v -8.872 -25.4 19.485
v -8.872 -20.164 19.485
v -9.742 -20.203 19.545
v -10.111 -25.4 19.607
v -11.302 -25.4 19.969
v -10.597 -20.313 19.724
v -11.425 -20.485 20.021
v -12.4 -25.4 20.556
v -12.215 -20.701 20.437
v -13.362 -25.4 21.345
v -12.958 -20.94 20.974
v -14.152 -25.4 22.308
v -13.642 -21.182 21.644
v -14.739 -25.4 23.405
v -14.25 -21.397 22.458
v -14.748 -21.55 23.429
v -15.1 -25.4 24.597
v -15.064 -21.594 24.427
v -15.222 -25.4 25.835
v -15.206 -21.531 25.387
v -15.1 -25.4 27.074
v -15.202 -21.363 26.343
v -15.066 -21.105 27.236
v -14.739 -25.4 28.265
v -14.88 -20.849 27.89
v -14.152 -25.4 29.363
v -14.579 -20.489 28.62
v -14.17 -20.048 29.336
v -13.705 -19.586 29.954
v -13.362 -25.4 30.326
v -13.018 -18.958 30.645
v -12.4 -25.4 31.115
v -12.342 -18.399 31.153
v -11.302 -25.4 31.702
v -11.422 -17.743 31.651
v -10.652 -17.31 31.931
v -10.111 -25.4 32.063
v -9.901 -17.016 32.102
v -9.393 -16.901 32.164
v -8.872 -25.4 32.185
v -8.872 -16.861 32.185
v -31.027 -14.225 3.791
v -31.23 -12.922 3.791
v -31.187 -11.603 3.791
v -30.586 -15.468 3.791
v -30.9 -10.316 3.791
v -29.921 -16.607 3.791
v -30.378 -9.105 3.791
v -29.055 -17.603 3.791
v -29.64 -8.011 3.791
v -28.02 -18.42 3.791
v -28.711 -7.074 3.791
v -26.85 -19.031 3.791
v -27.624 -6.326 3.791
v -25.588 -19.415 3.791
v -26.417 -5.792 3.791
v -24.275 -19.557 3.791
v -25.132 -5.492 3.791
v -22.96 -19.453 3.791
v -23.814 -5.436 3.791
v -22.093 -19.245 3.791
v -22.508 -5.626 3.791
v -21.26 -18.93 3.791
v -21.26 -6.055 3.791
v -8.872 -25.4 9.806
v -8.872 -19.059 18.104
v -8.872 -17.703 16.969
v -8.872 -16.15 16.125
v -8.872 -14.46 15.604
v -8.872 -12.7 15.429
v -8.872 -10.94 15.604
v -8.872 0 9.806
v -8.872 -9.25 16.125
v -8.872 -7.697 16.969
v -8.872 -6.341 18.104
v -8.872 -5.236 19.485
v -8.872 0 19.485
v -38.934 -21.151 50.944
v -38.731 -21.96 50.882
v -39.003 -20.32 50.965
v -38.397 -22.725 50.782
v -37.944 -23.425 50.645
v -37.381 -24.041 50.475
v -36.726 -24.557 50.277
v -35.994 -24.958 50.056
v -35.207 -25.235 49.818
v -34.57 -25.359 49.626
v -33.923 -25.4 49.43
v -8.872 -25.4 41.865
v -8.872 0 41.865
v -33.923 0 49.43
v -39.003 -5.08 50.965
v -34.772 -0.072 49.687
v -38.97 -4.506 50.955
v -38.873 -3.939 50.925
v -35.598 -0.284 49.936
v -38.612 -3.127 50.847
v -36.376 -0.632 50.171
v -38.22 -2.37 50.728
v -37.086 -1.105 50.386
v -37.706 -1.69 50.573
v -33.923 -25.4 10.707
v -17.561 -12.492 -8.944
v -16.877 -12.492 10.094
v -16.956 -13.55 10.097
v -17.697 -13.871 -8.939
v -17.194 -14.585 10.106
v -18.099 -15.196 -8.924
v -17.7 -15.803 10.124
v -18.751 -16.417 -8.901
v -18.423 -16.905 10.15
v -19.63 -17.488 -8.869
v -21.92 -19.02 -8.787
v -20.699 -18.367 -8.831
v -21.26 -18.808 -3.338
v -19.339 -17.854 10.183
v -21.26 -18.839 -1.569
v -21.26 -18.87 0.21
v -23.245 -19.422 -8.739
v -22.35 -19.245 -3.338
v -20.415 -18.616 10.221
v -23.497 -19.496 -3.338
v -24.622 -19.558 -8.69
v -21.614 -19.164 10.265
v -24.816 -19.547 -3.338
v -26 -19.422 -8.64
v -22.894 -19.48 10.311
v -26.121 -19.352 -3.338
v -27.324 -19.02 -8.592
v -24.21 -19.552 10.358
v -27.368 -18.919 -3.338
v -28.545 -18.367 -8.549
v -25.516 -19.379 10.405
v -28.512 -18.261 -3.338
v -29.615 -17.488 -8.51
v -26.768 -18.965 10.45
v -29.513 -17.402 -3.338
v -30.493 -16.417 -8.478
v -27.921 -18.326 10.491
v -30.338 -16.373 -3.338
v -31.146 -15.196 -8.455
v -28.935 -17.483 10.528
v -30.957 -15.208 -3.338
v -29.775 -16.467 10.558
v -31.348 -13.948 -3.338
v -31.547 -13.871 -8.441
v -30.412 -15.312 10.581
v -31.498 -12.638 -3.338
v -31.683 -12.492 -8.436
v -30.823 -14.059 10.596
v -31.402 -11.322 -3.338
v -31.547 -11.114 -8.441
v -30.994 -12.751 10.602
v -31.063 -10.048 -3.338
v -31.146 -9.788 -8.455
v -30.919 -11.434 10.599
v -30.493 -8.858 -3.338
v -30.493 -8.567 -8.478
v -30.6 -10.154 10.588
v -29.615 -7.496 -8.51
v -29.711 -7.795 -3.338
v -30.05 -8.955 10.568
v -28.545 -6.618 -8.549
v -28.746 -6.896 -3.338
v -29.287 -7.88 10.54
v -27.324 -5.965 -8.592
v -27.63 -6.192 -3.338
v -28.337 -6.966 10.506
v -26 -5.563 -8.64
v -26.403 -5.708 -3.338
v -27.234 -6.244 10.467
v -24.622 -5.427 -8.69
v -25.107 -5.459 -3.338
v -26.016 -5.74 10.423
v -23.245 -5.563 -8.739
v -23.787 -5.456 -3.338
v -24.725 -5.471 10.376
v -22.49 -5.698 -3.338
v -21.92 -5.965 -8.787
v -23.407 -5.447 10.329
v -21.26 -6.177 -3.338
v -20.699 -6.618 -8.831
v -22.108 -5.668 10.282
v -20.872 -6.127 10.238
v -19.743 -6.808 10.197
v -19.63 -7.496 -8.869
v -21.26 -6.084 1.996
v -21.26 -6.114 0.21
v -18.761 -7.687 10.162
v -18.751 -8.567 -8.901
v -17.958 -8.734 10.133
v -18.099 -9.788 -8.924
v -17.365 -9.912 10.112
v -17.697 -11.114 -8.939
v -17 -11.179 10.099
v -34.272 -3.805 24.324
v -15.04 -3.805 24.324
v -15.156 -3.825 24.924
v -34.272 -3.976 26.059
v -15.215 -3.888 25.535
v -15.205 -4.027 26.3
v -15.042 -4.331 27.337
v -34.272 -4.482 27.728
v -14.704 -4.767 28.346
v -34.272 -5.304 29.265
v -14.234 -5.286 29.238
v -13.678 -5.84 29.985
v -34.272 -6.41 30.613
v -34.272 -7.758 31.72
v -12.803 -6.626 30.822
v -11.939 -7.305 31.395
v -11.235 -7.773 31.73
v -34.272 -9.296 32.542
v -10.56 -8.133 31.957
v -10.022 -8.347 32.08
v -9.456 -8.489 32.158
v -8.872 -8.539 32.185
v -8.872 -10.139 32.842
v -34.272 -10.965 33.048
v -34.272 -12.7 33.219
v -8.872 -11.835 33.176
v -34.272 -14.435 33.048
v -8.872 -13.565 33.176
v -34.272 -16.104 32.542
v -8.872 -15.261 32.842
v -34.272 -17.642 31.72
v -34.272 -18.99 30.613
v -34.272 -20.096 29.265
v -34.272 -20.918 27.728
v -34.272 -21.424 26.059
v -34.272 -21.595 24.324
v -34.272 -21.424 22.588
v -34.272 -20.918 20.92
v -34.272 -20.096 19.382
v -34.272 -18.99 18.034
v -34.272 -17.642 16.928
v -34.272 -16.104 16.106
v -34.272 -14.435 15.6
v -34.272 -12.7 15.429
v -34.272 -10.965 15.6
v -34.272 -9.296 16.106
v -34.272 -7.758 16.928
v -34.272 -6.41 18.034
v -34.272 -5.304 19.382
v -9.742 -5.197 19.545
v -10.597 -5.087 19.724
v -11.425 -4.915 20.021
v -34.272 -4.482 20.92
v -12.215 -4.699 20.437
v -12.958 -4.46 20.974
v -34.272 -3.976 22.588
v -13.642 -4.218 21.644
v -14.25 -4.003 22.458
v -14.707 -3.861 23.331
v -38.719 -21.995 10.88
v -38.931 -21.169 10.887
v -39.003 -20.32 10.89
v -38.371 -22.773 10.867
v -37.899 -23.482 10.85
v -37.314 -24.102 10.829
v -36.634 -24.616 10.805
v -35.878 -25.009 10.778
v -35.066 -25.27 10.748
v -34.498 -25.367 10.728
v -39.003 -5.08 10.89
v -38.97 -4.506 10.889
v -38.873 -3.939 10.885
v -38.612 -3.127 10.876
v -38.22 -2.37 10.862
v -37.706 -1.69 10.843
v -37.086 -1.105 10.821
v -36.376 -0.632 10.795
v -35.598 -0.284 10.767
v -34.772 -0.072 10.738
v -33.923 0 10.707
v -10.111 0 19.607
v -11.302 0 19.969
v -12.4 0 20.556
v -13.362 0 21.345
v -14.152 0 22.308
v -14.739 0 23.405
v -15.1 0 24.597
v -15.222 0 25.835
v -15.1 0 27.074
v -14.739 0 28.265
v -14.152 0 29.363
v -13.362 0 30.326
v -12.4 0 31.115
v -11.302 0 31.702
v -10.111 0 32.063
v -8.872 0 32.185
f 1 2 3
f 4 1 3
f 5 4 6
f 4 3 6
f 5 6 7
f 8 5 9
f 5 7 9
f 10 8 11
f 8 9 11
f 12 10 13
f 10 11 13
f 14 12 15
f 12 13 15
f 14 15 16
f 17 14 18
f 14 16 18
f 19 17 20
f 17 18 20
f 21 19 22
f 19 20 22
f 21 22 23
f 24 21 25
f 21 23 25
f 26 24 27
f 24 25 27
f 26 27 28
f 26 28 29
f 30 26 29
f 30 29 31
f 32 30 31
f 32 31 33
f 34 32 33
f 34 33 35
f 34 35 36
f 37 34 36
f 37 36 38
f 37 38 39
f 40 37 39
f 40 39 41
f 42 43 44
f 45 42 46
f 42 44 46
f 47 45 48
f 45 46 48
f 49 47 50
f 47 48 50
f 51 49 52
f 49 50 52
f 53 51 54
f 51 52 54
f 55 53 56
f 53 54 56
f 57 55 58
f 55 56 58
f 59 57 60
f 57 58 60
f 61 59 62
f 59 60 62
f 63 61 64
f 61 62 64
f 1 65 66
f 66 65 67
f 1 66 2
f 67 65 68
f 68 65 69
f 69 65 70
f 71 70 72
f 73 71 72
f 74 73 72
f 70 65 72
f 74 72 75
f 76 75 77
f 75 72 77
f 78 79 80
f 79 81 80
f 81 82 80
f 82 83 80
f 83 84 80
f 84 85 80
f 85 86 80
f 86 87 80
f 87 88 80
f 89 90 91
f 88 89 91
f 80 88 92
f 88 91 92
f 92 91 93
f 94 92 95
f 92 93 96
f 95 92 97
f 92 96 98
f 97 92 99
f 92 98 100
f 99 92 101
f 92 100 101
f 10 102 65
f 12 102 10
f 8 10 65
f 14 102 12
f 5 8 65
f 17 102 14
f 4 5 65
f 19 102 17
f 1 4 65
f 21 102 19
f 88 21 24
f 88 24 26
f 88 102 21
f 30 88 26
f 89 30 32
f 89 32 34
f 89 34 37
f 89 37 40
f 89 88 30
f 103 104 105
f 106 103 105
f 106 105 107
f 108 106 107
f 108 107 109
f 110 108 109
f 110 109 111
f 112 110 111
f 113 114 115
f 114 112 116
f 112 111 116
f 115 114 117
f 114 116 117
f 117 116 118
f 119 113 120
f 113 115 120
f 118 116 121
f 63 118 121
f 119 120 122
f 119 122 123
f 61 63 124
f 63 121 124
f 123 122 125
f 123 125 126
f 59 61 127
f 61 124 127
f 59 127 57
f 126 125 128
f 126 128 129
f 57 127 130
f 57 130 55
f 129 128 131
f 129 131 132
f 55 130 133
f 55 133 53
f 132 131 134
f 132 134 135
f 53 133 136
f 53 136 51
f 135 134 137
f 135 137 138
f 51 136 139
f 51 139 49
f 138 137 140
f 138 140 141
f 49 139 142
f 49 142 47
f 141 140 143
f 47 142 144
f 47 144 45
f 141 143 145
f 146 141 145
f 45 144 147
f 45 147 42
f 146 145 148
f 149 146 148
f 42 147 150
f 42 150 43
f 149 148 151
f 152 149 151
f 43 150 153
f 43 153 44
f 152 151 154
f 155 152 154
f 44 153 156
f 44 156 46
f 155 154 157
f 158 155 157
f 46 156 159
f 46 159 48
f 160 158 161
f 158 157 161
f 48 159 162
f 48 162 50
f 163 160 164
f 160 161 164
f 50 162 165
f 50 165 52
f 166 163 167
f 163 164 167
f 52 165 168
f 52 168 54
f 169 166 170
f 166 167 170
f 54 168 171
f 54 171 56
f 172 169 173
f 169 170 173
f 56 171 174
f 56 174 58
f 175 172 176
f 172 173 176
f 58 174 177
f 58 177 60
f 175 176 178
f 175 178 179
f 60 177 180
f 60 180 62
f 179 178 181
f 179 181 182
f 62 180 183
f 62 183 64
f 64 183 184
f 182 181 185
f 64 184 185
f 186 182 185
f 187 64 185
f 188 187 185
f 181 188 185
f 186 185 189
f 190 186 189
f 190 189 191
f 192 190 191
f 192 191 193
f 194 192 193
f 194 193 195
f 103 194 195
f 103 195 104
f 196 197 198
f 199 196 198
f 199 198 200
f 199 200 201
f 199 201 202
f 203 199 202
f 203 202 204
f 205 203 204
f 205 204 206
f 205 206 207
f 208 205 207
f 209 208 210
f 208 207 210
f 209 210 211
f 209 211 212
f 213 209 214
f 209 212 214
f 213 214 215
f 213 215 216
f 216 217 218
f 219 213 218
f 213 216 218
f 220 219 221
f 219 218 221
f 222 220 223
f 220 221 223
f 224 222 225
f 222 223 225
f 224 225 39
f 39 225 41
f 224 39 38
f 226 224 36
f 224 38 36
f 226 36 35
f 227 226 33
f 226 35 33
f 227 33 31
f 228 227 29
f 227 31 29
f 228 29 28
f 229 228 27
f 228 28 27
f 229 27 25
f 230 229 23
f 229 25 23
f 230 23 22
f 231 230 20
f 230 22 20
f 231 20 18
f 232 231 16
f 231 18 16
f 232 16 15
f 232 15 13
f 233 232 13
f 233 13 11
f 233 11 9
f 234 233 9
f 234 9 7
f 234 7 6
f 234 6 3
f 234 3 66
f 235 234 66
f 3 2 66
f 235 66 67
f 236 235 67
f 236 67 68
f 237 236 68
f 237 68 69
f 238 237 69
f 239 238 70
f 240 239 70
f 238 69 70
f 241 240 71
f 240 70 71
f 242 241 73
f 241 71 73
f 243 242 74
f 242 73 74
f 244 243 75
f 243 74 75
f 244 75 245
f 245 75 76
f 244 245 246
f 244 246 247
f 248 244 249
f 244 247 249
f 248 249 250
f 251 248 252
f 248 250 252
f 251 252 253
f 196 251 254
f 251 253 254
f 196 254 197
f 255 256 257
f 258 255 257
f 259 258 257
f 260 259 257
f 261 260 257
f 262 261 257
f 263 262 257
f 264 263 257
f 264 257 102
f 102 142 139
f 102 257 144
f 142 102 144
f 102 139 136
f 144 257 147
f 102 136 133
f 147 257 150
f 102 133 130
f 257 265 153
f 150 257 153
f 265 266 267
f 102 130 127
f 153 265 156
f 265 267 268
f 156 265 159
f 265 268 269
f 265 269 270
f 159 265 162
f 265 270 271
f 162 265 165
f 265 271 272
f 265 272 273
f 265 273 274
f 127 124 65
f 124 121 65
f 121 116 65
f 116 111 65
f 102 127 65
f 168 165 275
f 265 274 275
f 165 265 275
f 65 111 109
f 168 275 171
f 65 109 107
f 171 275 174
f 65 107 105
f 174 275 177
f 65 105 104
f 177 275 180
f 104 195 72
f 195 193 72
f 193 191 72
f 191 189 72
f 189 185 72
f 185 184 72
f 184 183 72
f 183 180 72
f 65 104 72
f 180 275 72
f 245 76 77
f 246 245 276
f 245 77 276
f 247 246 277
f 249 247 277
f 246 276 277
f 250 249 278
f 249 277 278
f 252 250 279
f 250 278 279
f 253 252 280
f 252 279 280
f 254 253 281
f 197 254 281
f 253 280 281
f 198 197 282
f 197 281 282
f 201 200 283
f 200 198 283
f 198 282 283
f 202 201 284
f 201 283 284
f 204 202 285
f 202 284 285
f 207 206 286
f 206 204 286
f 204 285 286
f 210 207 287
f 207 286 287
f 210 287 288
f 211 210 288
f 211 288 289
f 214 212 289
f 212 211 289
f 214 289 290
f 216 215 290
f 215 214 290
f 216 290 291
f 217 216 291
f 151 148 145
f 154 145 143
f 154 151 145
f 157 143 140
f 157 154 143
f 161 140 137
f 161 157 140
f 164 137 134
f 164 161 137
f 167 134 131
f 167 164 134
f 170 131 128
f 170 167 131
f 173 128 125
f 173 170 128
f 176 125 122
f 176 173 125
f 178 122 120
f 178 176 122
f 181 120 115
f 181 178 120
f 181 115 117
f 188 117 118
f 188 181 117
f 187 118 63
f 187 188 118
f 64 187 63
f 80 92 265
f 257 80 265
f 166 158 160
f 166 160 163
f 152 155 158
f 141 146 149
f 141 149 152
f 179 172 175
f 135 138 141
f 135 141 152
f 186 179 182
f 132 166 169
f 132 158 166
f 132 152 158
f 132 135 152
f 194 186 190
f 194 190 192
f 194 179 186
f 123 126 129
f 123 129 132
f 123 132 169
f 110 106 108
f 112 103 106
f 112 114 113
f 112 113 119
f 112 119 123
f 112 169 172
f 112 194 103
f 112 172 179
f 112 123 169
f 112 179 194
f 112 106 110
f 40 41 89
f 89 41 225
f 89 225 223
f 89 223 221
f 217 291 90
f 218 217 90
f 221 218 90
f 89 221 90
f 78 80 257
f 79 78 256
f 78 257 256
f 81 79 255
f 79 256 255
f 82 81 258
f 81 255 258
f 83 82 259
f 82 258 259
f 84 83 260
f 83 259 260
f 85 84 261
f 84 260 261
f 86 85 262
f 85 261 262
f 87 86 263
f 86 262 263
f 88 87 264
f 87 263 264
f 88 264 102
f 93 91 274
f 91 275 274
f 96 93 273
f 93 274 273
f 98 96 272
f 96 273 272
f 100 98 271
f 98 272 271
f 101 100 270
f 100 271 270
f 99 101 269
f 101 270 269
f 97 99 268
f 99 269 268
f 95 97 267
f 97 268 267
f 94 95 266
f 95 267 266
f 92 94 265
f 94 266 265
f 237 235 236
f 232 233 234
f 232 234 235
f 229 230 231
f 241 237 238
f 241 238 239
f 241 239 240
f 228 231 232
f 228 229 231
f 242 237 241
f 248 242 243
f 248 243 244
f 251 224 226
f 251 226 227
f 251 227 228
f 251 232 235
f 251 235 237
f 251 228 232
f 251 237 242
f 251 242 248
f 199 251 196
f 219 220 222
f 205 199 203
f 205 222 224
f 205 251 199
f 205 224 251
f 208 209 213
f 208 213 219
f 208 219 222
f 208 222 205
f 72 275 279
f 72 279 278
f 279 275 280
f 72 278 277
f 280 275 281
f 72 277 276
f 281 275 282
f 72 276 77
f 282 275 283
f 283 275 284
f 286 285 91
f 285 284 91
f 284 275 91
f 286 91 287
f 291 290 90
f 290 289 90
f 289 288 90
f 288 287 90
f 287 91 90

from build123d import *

# Parameters (mm, degrees)
F1_DEPTH  = 25.4
F2_R      = 8.894978
F3_DEPTH  = 12.7
F4_DEPTH  = 25.4
F5_R      = 7.065357
F6_DEPTH  = 19.05
F7_W      = 13.161447
F7_H      = 7.129116
F8_DEPTH  = 25.401
F9_R      = 6.35
F10_DEPTH = 25.401
F11_R     = 5.08
F12_R     = 5.08


with BuildPart() as f1:
    # F0 (on Front) → F1 (new body)
    with BuildSketch(Plane.XZ):
        Polygon((-8.872092, 41.864544), (-39.002884, 50.96459), (-39.002884, 10.889949), (-8.872092, 9.806205), align=None)
    extrude(amount=F1_DEPTH)

    # F2 (on face) → F3 (join)
    with BuildSketch(Plane.YZ.offset(-8.872092)):
        with Locations((-12.7, 24.323635)):
            Circle(F2_R)
    extrude(amount=-F3_DEPTH)

    # F2 (on face) → F4 (cut)
    with BuildSketch(Plane.YZ.offset(-8.872092)):
        with Locations((-12.7, 24.323635)):
            Circle(F2_R)
    extrude(amount=-F4_DEPTH, mode=Mode.SUBTRACT)

    # F5 (on face) → F6 (join)
    with BuildSketch(Plane(origin=(0.340791, 0, 9.474836), x_dir=(0.999354, 0, -0.035945), z_dir=(-0.035945, 0, -0.999354))):
        with Locations((-24.293978, 12.492171)):
            Circle(F5_R)
    extrude(amount=F6_DEPTH)

    # F7 (on Front) → F8 (cut, through all)
    with BuildSketch(Plane.XZ):
        with Locations((-27.840523, 0.226574)):
            Rectangle(F7_W, F7_H)
    extrude(amount=F8_DEPTH, mode=Mode.SUBTRACT)

    # F9 (on face) → F10 (cut, through all)
    with BuildSketch(Plane(origin=(0, 0, 0), x_dir=(-1, 0, 0), z_dir=(0, 1, 0))):
        with Locations((8.872092, 25.835374)):
            Circle(F9_R)
    extrude(amount=-F10_DEPTH, mode=Mode.SUBTRACT)

    # F11
    f11_edges = [f1.edges().sort_by_distance(p)[0] for p in [
        (-39.002884, 0, 30.92727),
    ]]
    fillet(f11_edges, radius=F11_R)

    # F12
    f12_edges = [f1.edges().sort_by_distance(p)[0] for p in [
        (-39.002884, -25.4, 30.92727),
    ]]
    fillet(f12_edges, radius=F12_R)


solid = f1.part
